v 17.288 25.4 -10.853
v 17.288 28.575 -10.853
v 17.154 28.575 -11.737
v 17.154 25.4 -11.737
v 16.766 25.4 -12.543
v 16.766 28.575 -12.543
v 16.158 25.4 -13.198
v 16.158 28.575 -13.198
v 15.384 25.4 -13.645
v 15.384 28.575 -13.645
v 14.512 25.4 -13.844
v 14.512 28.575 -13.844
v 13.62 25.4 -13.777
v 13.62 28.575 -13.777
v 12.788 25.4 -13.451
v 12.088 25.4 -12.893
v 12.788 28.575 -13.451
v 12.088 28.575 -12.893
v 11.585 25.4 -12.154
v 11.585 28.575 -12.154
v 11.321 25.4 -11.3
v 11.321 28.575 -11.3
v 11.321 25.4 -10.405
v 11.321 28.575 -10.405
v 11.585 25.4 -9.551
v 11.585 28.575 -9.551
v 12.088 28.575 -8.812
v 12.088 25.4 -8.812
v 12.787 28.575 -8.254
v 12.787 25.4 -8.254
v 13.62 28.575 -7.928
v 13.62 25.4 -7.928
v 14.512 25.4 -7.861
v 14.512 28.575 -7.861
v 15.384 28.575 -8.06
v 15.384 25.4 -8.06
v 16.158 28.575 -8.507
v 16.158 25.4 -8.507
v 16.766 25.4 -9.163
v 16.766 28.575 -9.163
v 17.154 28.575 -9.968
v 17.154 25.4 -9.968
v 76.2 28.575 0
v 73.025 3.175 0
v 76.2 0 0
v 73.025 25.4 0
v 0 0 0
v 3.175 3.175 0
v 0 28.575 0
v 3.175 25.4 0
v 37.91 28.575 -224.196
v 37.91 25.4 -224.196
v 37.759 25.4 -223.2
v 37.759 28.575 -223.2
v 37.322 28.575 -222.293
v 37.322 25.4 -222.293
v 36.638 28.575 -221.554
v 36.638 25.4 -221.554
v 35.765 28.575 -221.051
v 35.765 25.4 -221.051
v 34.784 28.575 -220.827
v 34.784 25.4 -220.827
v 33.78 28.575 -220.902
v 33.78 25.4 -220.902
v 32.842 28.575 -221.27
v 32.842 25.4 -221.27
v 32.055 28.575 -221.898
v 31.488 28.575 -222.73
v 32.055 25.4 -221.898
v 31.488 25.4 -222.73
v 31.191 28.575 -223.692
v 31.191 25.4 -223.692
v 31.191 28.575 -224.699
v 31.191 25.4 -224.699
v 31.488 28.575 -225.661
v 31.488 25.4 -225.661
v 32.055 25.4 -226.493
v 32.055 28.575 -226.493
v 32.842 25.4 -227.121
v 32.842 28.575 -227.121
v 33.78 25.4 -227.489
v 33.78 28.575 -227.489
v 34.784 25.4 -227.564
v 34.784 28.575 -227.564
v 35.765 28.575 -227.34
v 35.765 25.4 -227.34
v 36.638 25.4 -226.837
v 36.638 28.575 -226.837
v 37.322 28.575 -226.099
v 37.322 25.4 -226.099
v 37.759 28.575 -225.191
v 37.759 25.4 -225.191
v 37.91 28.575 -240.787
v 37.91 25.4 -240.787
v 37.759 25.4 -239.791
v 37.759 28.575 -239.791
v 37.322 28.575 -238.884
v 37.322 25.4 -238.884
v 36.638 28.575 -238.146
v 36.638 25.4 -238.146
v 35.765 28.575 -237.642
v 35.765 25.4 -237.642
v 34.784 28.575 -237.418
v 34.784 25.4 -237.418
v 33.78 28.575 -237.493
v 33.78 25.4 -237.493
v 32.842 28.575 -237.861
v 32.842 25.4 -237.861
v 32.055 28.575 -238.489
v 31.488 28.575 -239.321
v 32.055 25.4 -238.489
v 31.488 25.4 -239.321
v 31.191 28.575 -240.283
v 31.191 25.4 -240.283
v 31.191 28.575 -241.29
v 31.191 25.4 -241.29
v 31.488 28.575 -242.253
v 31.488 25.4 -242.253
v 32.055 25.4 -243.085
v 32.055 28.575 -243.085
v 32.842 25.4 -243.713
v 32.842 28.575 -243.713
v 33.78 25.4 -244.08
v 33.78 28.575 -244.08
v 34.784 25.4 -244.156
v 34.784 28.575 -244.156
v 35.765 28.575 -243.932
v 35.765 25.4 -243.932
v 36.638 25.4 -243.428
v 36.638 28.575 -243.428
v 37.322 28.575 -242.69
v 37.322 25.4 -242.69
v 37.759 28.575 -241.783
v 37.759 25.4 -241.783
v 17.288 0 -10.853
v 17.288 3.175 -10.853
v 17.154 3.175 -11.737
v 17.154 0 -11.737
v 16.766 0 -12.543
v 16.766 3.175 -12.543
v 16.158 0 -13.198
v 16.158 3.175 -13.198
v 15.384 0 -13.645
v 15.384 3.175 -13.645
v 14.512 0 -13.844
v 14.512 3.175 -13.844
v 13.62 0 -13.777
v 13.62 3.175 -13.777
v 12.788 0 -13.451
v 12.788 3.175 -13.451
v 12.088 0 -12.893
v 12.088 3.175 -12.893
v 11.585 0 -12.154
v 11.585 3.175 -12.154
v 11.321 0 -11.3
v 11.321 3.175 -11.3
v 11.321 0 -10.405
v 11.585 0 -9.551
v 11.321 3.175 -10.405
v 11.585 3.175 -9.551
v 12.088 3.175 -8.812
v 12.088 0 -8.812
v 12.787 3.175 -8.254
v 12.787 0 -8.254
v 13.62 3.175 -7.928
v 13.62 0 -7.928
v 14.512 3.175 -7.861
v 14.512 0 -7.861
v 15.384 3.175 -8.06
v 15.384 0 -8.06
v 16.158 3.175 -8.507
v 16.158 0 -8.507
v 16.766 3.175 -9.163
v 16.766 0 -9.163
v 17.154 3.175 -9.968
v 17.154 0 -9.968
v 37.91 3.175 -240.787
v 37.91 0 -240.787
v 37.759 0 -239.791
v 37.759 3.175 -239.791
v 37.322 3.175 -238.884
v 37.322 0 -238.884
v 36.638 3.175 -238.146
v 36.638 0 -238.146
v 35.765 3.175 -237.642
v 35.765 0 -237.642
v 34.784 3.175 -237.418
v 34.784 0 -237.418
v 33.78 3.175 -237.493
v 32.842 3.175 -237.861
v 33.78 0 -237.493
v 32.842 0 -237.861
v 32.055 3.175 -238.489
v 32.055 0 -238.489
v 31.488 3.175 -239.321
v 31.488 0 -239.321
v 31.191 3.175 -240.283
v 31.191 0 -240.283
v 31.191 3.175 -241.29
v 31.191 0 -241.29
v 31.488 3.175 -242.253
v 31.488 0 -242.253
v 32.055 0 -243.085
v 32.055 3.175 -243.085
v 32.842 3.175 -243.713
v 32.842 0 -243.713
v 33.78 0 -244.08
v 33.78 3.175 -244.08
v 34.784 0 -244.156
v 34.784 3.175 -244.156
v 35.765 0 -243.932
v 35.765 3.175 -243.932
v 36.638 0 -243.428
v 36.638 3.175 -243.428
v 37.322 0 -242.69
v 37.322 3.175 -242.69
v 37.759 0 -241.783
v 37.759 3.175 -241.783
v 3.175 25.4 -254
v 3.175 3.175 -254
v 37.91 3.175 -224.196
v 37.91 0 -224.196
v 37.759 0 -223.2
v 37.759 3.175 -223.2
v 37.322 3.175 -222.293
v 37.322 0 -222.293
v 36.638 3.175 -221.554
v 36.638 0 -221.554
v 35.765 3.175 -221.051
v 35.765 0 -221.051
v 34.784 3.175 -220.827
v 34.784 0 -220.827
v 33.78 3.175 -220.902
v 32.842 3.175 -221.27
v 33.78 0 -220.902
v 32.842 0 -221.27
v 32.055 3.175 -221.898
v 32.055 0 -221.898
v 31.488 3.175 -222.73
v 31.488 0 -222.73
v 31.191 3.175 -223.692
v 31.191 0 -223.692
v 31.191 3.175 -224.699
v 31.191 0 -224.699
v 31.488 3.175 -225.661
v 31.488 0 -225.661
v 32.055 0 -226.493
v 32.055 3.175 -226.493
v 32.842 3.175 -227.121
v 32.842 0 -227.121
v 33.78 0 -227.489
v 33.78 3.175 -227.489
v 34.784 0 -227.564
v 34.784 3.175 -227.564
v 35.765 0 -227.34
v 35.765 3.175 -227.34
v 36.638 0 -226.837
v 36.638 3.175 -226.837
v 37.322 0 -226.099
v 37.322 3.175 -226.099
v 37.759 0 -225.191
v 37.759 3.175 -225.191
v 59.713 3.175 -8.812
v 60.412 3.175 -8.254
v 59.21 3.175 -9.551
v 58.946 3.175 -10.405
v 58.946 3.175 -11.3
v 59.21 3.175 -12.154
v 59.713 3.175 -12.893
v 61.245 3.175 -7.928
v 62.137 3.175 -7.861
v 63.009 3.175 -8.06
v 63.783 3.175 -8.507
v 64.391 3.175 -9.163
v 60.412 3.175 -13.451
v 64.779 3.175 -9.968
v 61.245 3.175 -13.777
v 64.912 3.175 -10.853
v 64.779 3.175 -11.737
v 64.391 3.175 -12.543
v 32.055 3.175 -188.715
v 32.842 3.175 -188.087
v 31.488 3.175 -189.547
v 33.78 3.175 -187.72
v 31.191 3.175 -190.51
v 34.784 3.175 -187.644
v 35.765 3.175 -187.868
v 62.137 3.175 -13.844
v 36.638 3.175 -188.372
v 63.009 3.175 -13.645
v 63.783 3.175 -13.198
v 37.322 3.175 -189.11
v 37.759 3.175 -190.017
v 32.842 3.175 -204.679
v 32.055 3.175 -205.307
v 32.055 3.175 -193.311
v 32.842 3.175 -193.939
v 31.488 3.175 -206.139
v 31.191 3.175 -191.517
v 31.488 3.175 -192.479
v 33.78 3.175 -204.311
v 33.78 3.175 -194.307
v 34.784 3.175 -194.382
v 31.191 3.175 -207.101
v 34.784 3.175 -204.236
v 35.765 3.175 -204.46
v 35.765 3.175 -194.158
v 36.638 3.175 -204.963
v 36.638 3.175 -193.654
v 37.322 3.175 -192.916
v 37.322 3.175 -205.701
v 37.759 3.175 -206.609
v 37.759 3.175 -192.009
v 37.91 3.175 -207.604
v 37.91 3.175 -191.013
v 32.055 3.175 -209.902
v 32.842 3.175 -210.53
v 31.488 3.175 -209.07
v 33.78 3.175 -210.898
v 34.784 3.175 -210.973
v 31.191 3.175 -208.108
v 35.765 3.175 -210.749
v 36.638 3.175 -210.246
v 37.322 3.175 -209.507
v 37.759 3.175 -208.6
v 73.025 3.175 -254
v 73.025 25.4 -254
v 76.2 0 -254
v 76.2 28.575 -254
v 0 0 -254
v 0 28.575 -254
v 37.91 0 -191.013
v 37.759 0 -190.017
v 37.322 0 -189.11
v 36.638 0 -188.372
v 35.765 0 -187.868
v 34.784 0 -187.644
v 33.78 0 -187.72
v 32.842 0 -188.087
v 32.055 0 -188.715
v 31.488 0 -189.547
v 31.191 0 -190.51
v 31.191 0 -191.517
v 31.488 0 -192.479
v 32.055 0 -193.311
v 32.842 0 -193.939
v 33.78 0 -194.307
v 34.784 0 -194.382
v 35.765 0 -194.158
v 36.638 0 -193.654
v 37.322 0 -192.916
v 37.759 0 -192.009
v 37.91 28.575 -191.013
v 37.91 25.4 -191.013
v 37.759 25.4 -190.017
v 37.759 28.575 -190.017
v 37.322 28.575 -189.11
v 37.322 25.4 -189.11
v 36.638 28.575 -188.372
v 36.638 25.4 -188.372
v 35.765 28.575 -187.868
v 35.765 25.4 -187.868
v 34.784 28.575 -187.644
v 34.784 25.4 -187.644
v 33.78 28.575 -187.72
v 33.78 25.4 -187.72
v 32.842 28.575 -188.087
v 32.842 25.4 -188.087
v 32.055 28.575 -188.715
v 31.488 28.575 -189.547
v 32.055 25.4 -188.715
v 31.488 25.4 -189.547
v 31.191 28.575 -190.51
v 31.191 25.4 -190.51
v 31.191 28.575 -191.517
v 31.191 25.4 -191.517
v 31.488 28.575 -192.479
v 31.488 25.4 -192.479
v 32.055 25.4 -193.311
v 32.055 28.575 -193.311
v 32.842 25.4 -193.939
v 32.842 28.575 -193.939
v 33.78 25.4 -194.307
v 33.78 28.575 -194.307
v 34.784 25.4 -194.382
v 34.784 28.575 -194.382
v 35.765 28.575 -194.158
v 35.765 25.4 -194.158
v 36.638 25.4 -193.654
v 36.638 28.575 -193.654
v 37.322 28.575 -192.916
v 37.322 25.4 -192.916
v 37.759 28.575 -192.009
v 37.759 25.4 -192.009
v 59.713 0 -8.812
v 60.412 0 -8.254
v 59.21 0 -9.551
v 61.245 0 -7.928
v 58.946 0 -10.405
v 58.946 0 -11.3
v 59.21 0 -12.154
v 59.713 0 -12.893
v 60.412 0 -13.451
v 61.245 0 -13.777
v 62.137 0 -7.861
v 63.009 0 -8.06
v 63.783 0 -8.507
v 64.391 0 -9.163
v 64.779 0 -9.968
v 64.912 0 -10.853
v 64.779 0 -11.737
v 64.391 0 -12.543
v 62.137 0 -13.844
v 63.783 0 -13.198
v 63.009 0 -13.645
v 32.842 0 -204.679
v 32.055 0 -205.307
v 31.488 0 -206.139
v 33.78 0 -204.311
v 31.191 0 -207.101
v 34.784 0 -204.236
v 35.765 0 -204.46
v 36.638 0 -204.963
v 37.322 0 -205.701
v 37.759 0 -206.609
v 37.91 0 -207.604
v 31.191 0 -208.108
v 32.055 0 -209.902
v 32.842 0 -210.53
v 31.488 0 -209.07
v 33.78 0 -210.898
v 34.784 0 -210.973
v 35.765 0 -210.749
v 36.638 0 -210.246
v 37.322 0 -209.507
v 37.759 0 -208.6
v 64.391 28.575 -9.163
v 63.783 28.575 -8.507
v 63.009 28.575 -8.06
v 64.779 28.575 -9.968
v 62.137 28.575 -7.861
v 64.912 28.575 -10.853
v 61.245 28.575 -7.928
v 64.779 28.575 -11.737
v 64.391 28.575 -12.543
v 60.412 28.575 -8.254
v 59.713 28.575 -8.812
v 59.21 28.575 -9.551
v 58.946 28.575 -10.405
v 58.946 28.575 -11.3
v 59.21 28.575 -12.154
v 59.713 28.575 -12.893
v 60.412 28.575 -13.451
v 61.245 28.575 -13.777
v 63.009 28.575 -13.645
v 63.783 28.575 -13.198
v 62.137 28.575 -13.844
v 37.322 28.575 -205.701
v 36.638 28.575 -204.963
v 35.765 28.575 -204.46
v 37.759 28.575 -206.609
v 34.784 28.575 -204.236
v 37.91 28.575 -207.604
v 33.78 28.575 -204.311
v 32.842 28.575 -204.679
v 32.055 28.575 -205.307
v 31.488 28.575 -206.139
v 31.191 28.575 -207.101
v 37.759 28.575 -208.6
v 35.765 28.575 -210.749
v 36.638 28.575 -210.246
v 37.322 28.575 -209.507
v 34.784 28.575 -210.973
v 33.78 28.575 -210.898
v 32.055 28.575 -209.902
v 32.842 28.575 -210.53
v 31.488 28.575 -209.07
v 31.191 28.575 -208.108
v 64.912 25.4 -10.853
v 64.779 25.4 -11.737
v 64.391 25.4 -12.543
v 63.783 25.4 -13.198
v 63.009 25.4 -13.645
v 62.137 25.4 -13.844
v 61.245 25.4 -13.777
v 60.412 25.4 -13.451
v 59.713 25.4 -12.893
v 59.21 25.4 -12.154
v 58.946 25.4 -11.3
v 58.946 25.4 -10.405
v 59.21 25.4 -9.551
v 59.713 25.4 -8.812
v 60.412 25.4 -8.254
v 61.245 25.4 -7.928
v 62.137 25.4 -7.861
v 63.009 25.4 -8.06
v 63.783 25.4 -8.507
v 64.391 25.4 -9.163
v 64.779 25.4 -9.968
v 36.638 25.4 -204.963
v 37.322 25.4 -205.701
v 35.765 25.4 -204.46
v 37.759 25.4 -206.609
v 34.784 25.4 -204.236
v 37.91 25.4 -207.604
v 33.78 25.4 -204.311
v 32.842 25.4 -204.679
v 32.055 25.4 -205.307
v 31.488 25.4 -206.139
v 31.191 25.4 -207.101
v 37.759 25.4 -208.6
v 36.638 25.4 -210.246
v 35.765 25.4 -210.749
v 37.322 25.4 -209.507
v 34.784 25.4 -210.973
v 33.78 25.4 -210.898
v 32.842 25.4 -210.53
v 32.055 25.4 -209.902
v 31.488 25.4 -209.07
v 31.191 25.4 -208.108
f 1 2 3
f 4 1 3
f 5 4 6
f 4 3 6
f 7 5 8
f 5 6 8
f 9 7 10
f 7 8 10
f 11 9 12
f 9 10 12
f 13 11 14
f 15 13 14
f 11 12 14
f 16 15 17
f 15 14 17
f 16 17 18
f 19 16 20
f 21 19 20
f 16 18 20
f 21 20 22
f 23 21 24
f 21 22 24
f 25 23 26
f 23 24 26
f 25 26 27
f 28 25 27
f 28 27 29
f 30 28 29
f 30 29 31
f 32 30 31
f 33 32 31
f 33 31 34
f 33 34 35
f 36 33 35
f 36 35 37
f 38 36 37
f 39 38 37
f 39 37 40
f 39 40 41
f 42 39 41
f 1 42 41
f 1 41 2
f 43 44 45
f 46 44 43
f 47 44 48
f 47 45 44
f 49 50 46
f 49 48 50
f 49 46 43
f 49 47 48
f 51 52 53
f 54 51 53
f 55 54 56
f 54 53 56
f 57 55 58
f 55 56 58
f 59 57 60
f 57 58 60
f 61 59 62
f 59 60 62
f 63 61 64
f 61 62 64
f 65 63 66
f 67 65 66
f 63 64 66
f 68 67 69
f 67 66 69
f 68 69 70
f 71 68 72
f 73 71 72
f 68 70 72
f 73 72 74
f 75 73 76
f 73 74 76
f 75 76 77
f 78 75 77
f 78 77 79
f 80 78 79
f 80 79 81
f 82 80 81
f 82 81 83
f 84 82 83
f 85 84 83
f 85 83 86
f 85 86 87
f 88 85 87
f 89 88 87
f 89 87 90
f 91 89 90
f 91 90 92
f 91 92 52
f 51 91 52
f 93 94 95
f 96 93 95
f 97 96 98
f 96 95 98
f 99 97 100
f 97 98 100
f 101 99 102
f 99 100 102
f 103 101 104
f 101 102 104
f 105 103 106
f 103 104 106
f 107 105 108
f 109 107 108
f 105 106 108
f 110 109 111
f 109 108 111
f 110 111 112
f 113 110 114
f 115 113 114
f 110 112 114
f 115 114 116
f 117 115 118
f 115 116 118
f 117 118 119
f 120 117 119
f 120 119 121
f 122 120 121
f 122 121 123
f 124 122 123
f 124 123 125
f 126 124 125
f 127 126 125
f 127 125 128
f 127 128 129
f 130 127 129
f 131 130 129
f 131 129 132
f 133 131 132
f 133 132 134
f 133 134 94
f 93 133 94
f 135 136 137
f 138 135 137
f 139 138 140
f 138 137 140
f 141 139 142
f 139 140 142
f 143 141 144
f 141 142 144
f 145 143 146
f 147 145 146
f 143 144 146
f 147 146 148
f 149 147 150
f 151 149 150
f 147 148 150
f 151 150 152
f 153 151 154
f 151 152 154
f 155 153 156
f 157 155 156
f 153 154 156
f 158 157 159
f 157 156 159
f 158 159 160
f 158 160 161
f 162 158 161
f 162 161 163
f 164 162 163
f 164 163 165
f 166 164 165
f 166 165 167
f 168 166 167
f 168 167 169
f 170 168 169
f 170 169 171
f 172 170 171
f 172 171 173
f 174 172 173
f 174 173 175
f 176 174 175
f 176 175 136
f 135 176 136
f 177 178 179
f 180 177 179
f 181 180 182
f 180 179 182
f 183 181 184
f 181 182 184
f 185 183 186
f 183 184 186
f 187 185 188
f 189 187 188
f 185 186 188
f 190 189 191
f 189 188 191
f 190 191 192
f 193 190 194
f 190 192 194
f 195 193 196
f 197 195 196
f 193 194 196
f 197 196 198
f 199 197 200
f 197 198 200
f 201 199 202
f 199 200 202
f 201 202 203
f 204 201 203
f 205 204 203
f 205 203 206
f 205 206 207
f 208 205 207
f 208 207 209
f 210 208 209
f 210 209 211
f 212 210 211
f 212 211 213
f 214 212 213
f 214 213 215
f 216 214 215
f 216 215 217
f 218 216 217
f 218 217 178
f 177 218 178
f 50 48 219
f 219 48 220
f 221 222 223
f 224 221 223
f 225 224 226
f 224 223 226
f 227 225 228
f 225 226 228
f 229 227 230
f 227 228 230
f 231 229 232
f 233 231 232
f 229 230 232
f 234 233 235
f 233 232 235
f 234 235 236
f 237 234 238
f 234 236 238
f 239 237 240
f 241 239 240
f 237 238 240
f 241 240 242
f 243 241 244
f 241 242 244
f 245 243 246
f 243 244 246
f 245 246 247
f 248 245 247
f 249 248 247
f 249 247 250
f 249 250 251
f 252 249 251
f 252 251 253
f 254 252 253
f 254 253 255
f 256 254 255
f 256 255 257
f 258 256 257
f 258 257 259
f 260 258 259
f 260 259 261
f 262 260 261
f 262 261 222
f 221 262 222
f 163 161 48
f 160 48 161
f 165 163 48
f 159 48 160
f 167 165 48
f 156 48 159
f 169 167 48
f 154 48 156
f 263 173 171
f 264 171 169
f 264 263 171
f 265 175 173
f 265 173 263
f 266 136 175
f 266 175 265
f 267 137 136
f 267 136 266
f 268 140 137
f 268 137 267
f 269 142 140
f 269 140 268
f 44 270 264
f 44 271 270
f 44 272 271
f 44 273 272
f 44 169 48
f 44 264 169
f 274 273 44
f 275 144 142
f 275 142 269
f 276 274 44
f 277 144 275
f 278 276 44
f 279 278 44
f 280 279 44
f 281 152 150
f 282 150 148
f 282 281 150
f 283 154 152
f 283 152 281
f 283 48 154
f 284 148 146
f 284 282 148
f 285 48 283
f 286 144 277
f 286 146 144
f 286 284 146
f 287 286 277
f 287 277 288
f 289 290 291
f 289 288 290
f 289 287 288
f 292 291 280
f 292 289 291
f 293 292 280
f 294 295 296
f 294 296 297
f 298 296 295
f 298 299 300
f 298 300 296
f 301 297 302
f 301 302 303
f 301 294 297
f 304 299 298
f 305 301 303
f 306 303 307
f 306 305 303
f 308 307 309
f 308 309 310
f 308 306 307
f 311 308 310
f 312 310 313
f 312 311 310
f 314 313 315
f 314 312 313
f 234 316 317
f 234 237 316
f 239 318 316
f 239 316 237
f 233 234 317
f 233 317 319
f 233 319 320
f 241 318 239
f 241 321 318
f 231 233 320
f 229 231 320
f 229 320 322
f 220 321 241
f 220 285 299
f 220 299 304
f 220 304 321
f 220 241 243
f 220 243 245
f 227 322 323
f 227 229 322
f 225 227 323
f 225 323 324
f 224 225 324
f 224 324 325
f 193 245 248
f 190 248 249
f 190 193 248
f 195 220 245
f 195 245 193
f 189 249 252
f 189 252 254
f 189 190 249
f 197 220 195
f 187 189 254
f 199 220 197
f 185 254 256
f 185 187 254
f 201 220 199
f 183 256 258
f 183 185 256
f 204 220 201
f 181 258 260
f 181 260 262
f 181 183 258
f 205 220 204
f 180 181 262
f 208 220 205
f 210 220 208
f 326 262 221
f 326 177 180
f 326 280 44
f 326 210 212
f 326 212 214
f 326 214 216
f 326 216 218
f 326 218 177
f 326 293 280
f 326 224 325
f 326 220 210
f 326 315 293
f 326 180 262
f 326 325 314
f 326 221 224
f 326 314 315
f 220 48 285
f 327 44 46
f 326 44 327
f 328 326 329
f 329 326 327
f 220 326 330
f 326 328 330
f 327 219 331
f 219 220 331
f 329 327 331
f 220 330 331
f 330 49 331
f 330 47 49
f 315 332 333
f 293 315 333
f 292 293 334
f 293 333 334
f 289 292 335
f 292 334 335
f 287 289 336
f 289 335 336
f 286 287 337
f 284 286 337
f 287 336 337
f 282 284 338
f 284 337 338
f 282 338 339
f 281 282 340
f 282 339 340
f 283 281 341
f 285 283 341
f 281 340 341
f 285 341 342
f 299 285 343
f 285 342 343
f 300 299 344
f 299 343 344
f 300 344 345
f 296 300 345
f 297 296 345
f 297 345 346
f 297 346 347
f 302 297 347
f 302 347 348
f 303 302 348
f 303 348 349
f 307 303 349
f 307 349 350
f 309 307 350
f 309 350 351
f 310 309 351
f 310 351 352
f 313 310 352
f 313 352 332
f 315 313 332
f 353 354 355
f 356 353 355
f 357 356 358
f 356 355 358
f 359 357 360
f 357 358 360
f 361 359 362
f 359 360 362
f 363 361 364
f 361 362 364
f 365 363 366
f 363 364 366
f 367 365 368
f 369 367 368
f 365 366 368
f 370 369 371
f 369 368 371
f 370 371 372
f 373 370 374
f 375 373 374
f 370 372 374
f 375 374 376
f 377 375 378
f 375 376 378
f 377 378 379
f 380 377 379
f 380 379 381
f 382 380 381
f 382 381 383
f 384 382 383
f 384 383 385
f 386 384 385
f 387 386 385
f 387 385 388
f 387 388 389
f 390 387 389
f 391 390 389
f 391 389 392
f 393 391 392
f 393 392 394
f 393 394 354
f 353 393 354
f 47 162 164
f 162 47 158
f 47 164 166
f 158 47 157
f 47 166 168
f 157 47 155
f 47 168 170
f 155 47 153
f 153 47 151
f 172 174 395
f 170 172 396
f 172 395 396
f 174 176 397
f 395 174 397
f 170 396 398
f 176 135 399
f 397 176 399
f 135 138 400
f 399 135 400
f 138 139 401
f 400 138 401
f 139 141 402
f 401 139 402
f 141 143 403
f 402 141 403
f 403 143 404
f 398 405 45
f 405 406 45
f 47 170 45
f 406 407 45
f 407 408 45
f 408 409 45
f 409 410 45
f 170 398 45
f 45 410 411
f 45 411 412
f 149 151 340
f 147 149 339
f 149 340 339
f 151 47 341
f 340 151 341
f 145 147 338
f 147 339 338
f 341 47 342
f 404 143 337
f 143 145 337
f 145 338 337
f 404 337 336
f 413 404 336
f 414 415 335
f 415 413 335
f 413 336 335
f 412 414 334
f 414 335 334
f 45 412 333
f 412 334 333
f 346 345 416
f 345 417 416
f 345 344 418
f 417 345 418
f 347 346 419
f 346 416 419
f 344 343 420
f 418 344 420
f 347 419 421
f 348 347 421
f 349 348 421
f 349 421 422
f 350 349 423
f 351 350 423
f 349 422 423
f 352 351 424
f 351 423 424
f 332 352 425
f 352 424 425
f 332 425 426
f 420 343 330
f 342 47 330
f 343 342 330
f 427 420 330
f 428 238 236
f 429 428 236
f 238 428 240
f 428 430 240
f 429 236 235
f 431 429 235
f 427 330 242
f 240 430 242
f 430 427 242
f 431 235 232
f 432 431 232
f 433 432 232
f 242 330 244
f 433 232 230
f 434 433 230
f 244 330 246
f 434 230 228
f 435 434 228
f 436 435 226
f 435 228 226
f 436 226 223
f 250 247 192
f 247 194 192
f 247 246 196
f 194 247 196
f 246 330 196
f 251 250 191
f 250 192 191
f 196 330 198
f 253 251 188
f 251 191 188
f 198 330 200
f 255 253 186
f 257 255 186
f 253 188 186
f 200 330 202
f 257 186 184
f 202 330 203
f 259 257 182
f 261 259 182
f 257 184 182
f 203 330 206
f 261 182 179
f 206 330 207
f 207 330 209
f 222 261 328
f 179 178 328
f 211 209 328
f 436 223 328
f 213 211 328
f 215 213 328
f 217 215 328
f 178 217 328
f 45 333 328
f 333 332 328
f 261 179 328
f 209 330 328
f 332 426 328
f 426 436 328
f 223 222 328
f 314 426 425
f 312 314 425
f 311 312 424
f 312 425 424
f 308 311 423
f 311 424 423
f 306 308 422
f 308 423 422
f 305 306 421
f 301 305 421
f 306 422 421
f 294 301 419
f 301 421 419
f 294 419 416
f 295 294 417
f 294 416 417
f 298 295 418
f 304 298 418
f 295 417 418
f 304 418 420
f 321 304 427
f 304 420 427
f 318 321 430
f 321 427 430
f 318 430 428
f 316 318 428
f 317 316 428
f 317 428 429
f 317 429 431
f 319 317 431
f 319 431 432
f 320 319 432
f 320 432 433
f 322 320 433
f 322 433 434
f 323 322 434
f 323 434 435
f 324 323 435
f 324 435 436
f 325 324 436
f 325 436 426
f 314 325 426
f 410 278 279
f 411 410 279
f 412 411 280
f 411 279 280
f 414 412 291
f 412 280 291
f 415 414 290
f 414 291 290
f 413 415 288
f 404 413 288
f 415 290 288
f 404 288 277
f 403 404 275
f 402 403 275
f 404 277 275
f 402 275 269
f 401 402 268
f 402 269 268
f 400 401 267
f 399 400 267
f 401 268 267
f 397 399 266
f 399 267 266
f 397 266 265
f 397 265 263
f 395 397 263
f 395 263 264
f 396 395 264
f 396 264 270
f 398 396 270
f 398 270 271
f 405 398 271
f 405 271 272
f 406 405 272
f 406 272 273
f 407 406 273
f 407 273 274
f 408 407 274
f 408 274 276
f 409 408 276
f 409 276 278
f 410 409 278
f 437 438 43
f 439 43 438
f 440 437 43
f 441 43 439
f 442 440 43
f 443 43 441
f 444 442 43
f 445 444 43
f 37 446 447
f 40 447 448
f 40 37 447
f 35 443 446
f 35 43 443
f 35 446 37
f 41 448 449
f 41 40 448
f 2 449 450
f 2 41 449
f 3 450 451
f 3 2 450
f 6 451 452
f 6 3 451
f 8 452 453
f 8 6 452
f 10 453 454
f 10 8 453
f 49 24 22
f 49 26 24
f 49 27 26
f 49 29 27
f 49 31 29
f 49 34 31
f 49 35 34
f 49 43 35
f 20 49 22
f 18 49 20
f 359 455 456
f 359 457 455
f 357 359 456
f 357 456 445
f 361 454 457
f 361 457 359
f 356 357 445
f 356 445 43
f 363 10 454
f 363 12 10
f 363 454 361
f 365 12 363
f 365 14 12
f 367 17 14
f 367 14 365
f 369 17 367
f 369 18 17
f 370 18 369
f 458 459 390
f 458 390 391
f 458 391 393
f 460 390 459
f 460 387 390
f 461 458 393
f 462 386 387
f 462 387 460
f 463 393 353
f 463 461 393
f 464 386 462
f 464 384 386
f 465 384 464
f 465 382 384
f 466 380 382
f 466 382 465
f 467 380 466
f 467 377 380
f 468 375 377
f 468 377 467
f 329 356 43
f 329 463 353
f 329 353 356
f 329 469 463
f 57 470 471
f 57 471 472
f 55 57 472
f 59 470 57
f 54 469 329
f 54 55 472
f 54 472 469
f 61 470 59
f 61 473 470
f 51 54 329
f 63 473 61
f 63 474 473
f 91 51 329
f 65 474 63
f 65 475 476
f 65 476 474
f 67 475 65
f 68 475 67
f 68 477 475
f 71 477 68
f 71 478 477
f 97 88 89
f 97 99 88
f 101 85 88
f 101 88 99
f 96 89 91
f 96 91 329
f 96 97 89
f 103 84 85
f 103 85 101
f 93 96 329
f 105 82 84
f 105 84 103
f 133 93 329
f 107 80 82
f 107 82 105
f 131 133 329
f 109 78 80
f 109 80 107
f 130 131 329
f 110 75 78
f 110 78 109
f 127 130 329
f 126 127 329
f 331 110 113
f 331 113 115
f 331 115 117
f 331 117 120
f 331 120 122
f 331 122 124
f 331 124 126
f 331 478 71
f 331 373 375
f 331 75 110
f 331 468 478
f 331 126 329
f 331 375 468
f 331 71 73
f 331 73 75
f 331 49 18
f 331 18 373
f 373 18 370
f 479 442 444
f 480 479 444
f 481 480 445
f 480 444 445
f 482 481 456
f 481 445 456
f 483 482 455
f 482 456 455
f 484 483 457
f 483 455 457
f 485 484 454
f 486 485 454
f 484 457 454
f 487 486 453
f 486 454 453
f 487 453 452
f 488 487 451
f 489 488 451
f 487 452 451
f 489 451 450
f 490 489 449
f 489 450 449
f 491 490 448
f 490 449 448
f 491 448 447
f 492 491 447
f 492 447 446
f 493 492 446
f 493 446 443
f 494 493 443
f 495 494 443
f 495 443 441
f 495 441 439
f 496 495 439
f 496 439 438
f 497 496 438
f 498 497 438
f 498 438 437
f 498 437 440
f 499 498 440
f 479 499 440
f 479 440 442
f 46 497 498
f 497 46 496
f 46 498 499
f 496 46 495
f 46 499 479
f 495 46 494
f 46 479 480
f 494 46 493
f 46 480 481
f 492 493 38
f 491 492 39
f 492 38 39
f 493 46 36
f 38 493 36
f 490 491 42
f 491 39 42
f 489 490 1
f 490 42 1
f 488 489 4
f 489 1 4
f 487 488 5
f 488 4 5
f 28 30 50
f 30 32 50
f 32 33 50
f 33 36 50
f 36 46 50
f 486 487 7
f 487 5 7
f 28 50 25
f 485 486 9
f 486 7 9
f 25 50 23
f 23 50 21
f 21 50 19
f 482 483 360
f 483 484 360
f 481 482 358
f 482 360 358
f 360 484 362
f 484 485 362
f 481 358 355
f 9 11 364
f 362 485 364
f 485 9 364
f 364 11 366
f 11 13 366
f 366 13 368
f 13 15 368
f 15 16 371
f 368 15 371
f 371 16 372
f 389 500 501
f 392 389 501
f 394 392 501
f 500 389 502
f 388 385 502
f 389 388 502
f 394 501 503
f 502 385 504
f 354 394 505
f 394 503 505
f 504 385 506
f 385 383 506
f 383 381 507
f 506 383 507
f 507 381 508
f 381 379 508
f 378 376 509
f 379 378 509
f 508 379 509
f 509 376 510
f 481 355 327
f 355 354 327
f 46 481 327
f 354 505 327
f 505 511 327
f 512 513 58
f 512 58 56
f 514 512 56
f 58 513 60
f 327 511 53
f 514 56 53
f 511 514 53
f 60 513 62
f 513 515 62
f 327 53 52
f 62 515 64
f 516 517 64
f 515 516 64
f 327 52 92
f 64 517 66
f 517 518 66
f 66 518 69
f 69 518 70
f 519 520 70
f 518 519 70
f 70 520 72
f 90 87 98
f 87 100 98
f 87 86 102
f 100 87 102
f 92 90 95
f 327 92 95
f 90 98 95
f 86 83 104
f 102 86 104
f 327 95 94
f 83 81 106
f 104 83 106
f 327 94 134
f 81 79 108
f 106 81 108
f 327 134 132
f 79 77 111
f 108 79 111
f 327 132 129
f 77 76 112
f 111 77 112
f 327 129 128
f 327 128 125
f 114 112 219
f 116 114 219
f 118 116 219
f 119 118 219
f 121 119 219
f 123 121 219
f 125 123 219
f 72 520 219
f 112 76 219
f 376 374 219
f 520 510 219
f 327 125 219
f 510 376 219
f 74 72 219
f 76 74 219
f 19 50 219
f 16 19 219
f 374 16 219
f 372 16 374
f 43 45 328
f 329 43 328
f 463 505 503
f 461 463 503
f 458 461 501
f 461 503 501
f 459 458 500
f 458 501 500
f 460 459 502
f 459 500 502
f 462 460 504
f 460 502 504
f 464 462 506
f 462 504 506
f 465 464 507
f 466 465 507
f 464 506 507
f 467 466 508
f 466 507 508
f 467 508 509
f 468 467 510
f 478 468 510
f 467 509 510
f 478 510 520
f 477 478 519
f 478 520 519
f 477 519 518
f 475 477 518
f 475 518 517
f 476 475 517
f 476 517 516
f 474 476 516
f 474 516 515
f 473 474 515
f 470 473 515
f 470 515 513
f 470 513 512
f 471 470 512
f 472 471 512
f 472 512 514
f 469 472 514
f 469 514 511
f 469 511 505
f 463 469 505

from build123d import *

# Parameters (mm, degrees)
SKETCH1_W           = 76.2
SKETCH1_H           = 254
BOSS_EXTRUDE1_DEPTH = 3.175
SKETCH2_W           = 3.175
SKETCH2_H           = 254
BOSS_EXTRUDE2_DEPTH = 25.4
BOSS_EXTRUDE3_REACH = 75.025
SKETCH3_W           = 254
SKETCH3_H           = 3.175
SKETCH4_R           = 3.3782
CUT_EXTRUDE1_DEPTH  = 29.575
SKETCH5_R           = 3
CUT_EXTRUDE2_DEPTH  = 29.575


with BuildPart() as part:
    # Sketch1 → Boss-Extrude1 (new body)
    with BuildSketch(Plane(origin=(0, 0, 0), x_dir=(1, 0, 0), z_dir=(0, 1, 0))):
        with Locations((38.1, 127)):
            Rectangle(SKETCH1_W, SKETCH1_H)
    extrude(amount=BOSS_EXTRUDE1_DEPTH)

    # Sketch2 → Boss-Extrude2 (add)
    with BuildSketch(Plane(origin=(0, 3.175, 0), x_dir=(1, 0, 0), z_dir=(0, 1, 0))):
        with Locations((1.5875, 127)):
            Rectangle(SKETCH2_W, SKETCH2_H)
        with Locations((74.6125, 127)):
            Rectangle(SKETCH2_W, SKETCH2_H)
    extrude(amount=BOSS_EXTRUDE2_DEPTH)

    # Sketch3 → Boss-Extrude3 (add, up to next)
    with BuildSketch(Plane(origin=(3.175, 0, 0), x_dir=(0, 0, -1), z_dir=(1, 0, 0)), mode=Mode.PRIVATE) as boss_extrude3_sk1:
        with Locations((127, 26.9875)):
            Rectangle(SKETCH3_W, SKETCH3_H)
    boss_extrude3_tool1 = extrude(boss_extrude3_sk1.sketch, amount=BOSS_EXTRUDE3_REACH, mode=Mode.PRIVATE) - part.part
    add(boss_extrude3_tool1.solids().sort_by_distance((3.175, 26.9875, -127))[0])

    # Sketch4 → Cut-Extrude1 (cut, through all)
    with BuildSketch(Plane.XZ):
        with Locations((34.5313, -191.01308)):
            Circle(SKETCH4_R)
        with Locations((34.5313, -207.60436)):
            Circle(SKETCH4_R)
        with Locations((34.5313, -224.19564)):
            Circle(SKETCH4_R)
        with Locations((34.5313, -240.78692)):
            Circle(SKETCH4_R)
    extrude(amount=-CUT_EXTRUDE1_DEPTH, mode=Mode.SUBTRACT)

    # Sketch5 → Cut-Extrude2 (cut, through all)
    with BuildSketch(Plane(origin=(0, 28.575, 0), x_dir=(1, 0, 0), z_dir=(0, 1, 0))):
        with Locations((14.2875, 10.852567875)):
            Circle(SKETCH5_R)
        with Locations((61.9125, 10.852567875)):
            Circle(SKETCH5_R)
    extrude(amount=-CUT_EXTRUDE2_DEPTH, mode=Mode.SUBTRACT)


solid = part.part
